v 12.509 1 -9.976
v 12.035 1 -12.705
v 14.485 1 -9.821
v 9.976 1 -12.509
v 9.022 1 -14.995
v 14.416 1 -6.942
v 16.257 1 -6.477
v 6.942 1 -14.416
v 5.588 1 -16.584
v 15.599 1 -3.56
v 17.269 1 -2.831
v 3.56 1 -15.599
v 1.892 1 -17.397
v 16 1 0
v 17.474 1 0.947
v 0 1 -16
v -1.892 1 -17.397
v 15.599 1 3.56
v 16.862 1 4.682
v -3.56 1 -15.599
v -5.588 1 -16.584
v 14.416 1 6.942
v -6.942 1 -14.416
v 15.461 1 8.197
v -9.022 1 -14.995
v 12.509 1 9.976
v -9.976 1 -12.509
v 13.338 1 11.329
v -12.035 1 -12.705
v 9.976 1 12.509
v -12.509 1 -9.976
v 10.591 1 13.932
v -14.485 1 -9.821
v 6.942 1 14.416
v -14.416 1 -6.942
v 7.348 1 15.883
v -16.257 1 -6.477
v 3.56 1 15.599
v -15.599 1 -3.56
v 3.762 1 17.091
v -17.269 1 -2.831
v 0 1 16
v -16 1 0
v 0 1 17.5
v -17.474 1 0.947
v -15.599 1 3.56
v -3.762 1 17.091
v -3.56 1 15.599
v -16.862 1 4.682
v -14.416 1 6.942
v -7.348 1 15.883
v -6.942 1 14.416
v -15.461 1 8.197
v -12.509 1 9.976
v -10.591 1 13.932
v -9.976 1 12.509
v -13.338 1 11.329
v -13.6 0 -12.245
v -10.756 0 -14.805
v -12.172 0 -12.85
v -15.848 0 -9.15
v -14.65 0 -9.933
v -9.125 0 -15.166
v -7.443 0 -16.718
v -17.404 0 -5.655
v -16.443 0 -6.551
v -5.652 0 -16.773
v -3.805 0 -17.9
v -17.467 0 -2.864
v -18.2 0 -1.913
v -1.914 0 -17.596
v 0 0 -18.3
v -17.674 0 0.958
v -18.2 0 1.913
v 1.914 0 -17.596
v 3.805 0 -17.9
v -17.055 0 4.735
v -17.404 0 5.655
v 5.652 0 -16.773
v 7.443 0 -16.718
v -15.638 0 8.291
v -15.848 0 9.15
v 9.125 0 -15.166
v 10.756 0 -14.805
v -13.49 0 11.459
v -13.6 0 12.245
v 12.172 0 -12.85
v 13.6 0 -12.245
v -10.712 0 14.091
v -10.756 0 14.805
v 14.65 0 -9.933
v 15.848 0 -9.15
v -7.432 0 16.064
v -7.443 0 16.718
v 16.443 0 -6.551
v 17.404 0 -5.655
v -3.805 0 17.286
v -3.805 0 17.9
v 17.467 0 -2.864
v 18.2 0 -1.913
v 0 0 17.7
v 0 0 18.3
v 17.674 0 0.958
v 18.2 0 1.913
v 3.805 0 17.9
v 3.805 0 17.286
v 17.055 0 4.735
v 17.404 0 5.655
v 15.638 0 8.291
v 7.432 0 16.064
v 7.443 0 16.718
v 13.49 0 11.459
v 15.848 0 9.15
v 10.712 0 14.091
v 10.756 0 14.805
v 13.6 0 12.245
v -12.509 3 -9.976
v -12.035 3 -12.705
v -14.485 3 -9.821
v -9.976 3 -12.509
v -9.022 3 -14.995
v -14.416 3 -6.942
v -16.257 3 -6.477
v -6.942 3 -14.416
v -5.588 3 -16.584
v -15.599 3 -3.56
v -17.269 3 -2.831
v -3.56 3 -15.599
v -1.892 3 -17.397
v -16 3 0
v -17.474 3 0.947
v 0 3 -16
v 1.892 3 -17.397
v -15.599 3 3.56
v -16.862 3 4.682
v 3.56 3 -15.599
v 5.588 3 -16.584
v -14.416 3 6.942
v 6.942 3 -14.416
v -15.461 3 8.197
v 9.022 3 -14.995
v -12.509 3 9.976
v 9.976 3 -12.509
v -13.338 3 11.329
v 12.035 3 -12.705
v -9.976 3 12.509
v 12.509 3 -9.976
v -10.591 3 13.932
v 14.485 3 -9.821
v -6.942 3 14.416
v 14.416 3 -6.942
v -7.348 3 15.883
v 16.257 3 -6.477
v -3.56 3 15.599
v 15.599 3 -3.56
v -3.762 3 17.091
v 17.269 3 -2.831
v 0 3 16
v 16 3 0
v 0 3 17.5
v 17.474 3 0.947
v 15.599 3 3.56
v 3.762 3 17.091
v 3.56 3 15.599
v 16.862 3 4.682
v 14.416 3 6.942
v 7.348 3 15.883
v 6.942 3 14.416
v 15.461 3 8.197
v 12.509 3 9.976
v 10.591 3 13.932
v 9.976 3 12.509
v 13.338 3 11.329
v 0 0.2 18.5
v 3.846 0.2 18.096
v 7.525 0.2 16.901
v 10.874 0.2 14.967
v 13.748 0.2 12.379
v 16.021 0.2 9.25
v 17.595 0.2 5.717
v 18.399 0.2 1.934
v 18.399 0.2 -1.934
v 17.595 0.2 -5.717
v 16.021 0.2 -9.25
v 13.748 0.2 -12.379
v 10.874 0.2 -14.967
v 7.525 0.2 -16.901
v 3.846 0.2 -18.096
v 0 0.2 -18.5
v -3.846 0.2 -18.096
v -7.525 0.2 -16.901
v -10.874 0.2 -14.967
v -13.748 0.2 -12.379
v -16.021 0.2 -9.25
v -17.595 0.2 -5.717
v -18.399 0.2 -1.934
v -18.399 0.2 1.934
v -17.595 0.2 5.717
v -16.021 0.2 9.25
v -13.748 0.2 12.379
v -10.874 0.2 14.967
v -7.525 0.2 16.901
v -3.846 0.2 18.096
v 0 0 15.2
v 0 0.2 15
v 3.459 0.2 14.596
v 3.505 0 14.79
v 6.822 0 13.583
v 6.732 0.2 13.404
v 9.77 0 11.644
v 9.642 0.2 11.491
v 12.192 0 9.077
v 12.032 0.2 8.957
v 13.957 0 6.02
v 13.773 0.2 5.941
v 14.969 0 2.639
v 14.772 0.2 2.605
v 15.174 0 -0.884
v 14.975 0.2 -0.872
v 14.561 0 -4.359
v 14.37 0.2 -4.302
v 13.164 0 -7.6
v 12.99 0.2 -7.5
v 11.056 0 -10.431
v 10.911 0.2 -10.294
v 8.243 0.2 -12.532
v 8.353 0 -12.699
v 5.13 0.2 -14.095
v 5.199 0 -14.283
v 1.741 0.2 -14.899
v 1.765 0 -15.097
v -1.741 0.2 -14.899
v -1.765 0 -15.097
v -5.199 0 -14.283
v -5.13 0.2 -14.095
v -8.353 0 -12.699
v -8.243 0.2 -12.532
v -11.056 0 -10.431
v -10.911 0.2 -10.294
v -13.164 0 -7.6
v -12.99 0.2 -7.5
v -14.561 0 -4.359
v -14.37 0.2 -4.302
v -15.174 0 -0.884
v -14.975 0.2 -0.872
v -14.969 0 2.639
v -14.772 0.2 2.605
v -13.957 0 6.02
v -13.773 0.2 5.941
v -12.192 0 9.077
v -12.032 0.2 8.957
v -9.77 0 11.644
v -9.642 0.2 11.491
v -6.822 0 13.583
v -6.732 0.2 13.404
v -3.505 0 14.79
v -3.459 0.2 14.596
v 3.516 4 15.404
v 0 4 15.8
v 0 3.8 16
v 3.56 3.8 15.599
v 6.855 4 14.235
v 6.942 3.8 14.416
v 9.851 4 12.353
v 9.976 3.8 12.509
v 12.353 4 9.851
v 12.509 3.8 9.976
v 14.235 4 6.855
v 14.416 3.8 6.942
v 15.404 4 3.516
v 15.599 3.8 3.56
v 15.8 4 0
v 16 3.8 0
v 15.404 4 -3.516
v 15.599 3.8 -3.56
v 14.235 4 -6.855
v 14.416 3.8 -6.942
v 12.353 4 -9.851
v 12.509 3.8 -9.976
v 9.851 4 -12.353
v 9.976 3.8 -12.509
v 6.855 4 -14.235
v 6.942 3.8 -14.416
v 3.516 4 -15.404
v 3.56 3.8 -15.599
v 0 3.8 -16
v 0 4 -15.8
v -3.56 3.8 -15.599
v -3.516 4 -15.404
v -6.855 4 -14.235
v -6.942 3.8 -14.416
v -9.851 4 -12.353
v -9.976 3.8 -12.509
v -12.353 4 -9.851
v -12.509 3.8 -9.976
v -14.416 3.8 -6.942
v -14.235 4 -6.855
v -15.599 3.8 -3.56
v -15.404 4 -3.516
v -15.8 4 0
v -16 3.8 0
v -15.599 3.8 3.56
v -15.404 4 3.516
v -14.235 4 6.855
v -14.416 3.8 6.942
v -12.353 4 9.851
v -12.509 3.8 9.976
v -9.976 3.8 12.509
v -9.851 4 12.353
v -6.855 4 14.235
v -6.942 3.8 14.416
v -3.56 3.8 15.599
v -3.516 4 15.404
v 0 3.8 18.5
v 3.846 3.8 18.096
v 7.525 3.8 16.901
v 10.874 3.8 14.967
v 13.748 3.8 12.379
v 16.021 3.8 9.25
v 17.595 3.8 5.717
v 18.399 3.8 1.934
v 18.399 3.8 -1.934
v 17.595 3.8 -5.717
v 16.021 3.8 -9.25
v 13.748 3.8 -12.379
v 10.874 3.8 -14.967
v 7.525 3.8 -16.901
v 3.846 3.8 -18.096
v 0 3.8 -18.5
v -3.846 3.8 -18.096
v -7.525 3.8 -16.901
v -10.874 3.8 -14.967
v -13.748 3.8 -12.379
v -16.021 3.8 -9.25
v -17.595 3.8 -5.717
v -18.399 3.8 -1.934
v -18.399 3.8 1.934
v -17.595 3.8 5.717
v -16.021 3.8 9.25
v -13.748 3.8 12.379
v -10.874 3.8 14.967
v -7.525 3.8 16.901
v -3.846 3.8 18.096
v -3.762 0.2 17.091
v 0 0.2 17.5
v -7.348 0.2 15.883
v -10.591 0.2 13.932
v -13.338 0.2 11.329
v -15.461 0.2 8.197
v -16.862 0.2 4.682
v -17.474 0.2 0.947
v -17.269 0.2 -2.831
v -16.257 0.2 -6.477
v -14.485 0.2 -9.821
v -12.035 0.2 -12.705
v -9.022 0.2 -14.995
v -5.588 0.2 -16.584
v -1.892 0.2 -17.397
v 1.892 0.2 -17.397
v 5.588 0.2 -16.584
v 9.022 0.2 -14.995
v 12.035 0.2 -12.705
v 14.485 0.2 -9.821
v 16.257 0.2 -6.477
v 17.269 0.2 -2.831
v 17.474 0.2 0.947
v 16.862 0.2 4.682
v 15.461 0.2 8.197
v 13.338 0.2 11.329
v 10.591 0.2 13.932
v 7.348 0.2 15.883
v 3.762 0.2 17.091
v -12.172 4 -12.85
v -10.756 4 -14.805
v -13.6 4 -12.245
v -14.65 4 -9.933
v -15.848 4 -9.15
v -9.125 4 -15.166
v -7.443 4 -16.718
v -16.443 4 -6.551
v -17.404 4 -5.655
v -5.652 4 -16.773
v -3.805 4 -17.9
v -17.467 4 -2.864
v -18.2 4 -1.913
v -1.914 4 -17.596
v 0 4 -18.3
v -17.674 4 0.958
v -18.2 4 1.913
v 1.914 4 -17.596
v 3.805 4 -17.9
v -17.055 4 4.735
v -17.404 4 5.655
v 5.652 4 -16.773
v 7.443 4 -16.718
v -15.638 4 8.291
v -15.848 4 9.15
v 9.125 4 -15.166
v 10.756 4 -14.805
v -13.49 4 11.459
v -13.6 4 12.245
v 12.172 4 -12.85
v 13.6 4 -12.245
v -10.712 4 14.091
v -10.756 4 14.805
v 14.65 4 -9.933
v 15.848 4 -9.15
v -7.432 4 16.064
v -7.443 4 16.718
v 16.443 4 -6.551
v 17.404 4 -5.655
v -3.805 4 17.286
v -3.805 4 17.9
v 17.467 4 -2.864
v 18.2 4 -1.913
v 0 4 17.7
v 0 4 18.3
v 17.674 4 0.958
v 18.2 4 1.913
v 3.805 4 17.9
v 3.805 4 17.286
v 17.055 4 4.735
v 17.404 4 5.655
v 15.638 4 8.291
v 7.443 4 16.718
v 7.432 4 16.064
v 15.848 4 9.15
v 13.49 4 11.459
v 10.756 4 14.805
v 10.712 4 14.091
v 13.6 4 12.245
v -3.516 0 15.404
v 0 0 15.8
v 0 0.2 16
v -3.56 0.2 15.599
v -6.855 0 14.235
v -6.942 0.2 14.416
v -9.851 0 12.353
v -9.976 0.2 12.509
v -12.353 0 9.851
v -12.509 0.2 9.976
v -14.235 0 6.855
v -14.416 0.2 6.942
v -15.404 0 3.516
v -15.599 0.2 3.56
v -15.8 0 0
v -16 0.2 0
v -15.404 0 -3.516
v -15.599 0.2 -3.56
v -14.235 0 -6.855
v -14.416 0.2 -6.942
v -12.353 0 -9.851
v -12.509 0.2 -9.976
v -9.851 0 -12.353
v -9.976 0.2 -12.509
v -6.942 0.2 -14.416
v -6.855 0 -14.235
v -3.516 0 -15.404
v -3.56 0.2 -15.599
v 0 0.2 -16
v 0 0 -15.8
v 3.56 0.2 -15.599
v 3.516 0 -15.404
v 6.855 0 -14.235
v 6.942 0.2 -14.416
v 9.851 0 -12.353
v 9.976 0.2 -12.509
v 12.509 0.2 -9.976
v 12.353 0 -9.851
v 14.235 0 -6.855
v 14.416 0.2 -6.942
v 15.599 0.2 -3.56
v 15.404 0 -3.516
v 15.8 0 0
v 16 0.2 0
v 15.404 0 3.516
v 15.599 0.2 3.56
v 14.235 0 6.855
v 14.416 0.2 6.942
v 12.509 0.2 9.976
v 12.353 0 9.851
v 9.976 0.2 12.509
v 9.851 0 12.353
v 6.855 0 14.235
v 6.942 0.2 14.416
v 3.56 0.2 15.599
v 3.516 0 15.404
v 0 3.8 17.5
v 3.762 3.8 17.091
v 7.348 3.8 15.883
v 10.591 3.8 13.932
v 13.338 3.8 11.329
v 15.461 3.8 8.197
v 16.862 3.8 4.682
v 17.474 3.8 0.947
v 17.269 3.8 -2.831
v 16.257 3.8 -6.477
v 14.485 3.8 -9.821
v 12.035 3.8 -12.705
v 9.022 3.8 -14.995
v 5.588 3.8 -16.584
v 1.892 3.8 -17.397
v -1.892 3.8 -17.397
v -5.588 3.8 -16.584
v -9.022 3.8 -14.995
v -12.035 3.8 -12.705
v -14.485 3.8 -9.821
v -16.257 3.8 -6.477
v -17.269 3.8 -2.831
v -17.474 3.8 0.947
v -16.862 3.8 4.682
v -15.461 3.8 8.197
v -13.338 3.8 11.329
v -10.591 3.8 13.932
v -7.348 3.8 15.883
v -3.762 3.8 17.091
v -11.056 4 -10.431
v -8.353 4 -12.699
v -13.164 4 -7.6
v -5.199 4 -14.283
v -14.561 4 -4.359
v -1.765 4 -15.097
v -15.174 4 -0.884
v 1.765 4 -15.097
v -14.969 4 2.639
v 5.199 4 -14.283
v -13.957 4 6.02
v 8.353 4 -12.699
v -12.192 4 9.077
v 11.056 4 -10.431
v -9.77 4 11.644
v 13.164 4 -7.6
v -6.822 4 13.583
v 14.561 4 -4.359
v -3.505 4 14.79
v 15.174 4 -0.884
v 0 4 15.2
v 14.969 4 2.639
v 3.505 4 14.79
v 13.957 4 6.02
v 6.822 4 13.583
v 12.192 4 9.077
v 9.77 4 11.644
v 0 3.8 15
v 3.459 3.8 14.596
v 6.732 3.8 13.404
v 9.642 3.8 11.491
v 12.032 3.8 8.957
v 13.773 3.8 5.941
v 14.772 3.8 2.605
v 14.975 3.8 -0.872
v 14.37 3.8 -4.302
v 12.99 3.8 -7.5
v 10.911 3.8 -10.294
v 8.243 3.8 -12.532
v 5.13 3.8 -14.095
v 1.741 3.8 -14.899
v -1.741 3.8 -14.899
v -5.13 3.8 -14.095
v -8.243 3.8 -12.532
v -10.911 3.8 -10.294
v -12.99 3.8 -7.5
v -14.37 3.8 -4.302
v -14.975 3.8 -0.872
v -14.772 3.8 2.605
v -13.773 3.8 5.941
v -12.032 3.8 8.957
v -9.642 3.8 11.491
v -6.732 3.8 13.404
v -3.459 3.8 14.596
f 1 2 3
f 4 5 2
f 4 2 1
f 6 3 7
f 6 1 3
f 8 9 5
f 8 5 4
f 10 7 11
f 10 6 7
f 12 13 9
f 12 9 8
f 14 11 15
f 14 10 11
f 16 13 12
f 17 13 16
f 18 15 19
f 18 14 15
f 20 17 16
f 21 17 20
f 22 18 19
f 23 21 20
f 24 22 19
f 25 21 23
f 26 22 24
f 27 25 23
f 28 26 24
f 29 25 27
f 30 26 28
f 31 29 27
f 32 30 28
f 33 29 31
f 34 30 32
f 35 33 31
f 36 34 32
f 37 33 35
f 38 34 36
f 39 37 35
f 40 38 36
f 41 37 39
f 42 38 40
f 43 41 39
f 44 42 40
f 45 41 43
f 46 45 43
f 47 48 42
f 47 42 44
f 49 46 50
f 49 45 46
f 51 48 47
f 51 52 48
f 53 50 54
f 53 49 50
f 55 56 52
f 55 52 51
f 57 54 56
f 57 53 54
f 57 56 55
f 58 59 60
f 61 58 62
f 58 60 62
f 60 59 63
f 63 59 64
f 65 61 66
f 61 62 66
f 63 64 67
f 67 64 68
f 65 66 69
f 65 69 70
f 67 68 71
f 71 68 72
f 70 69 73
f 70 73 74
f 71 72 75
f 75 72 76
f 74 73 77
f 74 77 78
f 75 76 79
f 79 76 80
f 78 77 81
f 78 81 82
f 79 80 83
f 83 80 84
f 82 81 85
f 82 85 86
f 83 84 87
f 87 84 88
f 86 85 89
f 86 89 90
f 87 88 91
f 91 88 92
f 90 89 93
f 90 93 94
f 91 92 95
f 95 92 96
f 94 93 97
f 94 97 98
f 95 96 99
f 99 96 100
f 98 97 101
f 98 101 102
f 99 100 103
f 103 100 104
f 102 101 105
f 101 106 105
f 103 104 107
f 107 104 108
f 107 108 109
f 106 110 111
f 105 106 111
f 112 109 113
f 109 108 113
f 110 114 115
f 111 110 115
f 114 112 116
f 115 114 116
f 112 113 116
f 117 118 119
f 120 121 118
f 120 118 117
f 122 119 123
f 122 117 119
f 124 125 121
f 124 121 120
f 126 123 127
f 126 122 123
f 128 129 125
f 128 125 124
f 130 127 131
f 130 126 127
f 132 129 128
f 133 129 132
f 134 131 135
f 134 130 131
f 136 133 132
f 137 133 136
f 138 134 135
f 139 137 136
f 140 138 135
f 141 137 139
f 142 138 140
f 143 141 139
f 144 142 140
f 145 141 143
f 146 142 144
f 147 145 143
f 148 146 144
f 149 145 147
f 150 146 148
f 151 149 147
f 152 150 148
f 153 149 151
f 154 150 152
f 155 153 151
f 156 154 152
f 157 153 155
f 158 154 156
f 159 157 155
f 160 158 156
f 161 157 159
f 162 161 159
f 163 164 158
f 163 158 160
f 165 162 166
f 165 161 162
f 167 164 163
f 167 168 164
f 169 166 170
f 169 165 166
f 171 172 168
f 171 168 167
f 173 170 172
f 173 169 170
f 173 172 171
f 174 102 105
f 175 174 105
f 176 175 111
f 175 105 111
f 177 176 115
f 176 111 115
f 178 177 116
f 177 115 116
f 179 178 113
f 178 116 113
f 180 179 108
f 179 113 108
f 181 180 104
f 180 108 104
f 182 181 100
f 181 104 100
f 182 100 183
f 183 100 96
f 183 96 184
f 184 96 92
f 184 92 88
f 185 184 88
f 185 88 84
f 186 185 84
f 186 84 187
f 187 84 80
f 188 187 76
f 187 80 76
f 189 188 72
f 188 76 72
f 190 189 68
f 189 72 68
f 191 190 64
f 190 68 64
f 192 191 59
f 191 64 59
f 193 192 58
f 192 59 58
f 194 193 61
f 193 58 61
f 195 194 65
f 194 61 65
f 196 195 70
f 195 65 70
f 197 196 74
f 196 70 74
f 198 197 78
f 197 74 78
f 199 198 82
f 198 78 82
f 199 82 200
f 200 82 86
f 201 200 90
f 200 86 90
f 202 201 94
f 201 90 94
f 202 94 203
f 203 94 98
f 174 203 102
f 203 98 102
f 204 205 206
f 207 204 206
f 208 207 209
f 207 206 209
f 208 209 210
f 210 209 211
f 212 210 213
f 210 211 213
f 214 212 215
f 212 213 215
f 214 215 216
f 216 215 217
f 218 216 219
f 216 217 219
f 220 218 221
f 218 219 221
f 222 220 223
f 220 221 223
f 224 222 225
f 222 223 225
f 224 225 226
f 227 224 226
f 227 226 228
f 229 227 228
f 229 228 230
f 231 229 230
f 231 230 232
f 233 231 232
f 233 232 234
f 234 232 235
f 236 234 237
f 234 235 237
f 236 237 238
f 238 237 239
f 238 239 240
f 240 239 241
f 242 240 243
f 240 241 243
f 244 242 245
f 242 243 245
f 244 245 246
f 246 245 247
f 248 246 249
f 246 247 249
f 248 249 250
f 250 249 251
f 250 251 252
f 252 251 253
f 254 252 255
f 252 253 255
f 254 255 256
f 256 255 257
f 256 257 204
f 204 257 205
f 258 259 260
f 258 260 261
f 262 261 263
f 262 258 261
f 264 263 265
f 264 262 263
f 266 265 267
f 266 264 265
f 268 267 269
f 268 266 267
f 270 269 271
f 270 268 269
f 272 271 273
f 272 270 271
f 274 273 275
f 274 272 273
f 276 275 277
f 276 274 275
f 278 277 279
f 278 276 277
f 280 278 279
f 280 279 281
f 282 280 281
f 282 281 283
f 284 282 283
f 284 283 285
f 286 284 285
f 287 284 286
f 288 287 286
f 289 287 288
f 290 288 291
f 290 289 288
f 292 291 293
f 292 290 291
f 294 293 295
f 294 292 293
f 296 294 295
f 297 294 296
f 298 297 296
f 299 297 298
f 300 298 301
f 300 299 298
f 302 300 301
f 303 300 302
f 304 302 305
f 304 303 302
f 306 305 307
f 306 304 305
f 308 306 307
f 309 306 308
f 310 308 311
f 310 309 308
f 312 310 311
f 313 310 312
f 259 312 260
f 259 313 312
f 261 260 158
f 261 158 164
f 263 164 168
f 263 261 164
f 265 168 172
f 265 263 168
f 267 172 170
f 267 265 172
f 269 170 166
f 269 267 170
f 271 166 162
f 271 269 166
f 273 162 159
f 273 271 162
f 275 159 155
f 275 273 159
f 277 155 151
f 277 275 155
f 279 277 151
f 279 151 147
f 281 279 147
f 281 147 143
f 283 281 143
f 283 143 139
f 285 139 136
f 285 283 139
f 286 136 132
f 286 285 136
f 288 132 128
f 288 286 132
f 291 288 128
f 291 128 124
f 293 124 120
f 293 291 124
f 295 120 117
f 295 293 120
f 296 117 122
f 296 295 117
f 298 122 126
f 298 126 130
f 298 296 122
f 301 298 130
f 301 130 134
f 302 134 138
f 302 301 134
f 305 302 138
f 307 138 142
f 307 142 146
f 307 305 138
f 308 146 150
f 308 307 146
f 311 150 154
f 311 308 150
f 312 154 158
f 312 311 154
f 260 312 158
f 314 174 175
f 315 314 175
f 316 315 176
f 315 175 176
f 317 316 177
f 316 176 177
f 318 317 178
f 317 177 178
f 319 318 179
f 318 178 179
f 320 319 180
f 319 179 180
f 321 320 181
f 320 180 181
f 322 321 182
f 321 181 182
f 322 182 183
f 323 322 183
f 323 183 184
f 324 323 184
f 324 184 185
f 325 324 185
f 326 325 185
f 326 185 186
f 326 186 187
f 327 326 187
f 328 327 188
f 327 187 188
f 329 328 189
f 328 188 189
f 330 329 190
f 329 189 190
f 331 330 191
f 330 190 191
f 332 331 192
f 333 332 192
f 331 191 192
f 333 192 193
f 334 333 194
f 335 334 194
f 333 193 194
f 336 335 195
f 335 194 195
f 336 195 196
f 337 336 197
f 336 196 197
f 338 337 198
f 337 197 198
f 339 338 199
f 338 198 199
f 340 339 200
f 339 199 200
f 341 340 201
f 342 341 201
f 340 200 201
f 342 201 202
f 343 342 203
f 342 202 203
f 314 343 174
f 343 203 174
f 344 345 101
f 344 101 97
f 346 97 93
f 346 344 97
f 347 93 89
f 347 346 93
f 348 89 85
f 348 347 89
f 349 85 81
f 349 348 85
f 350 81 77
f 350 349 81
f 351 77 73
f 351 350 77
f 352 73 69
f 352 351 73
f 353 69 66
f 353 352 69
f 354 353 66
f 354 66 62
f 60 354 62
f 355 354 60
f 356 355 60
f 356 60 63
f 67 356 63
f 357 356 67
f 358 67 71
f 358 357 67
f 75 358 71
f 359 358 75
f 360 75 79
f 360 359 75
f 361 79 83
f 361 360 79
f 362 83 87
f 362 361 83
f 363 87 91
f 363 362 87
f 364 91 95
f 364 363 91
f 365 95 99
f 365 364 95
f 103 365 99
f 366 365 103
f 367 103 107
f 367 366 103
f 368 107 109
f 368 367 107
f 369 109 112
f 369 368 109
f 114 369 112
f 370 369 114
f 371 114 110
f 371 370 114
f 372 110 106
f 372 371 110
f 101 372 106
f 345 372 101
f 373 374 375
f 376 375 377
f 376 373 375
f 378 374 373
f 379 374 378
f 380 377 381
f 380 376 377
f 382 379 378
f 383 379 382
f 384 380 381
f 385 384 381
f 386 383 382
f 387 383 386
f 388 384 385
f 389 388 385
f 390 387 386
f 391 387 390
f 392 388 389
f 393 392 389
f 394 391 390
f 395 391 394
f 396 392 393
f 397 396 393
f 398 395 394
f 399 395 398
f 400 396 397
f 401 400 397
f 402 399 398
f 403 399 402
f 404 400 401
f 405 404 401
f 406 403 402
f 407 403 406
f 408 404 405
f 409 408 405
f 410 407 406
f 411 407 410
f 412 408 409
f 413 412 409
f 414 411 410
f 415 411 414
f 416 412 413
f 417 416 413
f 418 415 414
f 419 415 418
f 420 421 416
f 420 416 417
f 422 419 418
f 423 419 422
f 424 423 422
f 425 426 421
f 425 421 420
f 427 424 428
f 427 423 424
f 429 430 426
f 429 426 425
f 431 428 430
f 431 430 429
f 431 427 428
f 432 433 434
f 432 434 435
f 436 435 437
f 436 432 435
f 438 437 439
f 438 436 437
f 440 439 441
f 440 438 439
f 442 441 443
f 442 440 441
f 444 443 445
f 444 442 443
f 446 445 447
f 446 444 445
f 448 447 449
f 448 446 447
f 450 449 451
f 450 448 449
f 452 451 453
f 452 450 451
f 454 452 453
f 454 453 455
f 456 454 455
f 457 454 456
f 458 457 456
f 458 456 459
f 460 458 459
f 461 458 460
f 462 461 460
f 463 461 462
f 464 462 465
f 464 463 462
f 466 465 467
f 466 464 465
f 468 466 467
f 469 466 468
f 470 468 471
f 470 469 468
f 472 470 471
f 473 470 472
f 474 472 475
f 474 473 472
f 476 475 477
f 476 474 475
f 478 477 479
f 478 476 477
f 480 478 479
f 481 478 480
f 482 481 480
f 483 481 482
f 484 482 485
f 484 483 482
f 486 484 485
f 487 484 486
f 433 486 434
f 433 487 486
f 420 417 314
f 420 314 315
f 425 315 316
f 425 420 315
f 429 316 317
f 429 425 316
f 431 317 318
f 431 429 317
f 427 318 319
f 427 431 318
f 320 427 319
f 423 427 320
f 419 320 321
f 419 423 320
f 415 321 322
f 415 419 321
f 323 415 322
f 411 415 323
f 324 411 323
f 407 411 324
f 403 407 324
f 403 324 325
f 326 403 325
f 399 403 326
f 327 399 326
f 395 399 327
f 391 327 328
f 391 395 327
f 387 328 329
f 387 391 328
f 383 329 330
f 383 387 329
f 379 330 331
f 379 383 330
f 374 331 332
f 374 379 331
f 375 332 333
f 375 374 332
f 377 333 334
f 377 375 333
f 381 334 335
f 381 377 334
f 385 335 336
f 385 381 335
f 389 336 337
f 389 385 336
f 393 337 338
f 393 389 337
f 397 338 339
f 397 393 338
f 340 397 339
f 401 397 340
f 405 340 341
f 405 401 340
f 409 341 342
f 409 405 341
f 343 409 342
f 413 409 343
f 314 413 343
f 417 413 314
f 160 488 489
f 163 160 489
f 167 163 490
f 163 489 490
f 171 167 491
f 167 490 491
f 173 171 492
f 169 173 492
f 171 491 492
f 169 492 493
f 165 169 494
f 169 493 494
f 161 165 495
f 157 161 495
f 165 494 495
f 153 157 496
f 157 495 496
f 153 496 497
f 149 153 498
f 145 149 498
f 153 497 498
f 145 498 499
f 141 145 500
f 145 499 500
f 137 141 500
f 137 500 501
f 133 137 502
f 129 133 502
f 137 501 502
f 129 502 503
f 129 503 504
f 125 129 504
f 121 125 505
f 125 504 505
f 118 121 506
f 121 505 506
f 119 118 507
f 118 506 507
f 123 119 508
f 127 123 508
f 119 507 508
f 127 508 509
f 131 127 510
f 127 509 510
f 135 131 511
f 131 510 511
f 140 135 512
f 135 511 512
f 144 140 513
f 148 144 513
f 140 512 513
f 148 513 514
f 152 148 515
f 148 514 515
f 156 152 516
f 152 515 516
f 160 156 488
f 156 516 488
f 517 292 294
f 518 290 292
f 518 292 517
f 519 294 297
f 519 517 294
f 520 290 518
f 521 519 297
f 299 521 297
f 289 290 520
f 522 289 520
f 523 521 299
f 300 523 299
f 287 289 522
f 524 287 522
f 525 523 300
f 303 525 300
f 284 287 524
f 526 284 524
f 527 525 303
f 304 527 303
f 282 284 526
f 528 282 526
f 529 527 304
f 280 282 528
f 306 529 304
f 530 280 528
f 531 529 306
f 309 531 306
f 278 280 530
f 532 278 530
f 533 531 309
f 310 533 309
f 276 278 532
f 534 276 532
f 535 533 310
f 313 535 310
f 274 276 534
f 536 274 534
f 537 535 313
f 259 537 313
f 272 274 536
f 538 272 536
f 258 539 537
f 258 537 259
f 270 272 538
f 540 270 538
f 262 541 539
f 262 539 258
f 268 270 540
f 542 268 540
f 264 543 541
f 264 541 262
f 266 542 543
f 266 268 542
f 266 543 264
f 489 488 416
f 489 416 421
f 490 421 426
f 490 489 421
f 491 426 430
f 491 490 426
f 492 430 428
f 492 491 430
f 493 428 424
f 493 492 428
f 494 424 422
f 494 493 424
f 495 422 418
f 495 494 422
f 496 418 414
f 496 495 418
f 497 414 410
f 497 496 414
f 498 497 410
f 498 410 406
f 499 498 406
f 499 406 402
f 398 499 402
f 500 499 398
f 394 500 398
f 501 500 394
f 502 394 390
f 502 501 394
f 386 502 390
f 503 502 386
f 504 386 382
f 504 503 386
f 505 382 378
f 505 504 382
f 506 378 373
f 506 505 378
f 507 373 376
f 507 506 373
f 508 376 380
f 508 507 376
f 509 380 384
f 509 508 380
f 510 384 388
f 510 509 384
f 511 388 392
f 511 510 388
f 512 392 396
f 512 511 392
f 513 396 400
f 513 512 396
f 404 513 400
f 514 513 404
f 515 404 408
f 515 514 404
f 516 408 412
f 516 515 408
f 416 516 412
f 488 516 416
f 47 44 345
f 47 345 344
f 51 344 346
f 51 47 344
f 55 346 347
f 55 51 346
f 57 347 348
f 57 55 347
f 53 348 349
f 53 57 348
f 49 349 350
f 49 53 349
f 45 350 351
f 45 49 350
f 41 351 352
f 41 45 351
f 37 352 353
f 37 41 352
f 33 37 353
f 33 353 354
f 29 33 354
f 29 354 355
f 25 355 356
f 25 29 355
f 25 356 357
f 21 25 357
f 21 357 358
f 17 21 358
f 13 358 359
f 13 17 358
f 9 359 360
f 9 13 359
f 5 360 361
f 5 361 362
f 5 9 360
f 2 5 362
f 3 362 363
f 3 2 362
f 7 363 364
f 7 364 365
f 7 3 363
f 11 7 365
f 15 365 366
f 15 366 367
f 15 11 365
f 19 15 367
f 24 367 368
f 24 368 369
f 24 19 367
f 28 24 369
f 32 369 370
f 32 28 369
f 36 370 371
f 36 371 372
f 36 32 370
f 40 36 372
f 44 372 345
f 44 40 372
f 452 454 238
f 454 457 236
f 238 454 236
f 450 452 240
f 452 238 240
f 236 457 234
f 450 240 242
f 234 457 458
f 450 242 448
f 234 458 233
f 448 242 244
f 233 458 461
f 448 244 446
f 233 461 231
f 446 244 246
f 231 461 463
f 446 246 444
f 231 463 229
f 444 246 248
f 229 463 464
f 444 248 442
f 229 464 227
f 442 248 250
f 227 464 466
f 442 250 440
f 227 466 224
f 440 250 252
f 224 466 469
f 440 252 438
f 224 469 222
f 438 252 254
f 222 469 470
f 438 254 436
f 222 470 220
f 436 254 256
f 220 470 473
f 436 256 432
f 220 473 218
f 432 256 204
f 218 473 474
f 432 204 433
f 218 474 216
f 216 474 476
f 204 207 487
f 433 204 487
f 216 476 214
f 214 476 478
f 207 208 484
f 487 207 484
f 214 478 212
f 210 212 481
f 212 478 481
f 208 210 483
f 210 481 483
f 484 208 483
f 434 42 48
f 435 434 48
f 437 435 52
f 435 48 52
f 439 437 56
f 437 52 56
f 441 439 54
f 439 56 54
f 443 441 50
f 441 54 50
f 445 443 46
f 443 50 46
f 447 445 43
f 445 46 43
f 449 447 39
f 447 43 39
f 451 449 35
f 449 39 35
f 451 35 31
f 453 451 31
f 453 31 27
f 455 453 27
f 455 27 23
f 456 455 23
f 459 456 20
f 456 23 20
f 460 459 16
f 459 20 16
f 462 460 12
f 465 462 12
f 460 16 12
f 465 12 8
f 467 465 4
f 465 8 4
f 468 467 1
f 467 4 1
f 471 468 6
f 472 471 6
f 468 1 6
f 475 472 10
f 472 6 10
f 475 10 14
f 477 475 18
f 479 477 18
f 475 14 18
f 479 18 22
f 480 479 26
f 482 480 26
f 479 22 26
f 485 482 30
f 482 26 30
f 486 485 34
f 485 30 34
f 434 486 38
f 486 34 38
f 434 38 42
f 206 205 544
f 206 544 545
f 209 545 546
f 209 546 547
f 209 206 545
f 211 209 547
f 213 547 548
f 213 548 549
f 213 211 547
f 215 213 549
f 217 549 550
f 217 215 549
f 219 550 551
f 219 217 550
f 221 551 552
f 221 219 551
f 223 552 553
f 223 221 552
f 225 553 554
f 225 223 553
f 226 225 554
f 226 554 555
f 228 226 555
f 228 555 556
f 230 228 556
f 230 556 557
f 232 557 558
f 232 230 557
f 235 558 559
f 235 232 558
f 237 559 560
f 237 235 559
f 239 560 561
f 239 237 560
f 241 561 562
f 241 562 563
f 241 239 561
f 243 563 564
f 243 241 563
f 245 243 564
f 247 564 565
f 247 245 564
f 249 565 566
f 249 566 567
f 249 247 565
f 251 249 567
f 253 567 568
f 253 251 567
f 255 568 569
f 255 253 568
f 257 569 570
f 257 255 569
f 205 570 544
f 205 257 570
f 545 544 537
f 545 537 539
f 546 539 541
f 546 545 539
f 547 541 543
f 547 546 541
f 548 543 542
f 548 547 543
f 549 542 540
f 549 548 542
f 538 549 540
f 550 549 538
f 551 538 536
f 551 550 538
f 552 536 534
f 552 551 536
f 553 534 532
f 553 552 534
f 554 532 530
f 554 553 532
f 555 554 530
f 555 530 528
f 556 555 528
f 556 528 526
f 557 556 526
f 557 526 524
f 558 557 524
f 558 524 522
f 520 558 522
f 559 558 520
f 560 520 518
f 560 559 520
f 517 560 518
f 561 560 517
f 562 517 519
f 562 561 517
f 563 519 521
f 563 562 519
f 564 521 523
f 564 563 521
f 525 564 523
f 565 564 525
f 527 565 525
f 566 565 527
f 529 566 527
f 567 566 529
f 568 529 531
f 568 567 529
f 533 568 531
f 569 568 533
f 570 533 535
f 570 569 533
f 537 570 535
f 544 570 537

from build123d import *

# Parameters (mm, degrees)
SKETCH1_R           = 18.5
SKETCH1_R_2         = 15
BOSS_EXTRUDE1_DEPTH = 4
SKETCH2_R           = 17.5
SKETCH2_R_2         = 16
CUT_EXTRUDE1_DEPTH  = 1
CUT_EXTRUDE2_START  = -1
SKETCH3_R           = 17.5
SKETCH3_R_2         = 16
CUT_EXTRUDE2_DEPTH  = 1
CHAMFER1_SIZE       = 0.2


with BuildPart() as part:
    # Sketch1 → Boss-Extrude1 (new body)
    with BuildSketch(Plane(origin=(0, 0, 0), x_dir=(1, 0, 0), z_dir=(0, 1, 0))):
        with Locations(Location((0, 0, 0), (0, 0, 270))):
            Circle(SKETCH1_R)
        with Locations(Location((0, 0, 0), (0, 0, 270))):
            Circle(SKETCH1_R_2, mode=Mode.SUBTRACT)
    extrude(amount=BOSS_EXTRUDE1_DEPTH)

    # Sketch2 → Cut-Extrude1 (cut)
    with BuildSketch(Plane(origin=(0, 4, 0), x_dir=(1, 0, 0), z_dir=(0, 1, 0))):
        with Locations(Location((0, 0, 0), (0, 0, 270))):
            Circle(SKETCH2_R)
        with Locations(Location((0, 0, 0), (0, 0, 270))):
            Circle(SKETCH2_R_2, mode=Mode.SUBTRACT)
    extrude(amount=-CUT_EXTRUDE1_DEPTH, mode=Mode.SUBTRACT)

    # Sketch3 → Cut-Extrude2 (cut)
    with BuildSketch(Plane.XZ.offset(CUT_EXTRUDE2_START)):
        with Locations(Location((0, 0, 0), (0, 0, 90))):
            Circle(SKETCH3_R)
        with Locations(Location((0, 0, 0), (0, 0, 90))):
            Circle(SKETCH3_R_2, mode=Mode.SUBTRACT)
    extrude(amount=CUT_EXTRUDE2_DEPTH, mode=Mode.SUBTRACT)

    # Chamfer1
    chamfer1_edges = [part.edges().sort_by_distance(p)[0] for p in [
        (0, 4, -17.5),
        (0, 4, -16),
        (0, 0, -18.5),
        (0, 0, -17.5),
        (0, 0, -16),
        (0, 4, -18.5),
        (0, 0, -15),
        (0, 4, -15),
    ]]
    chamfer(chamfer1_edges, length=CHAMFER1_SIZE)


solid = part.part
